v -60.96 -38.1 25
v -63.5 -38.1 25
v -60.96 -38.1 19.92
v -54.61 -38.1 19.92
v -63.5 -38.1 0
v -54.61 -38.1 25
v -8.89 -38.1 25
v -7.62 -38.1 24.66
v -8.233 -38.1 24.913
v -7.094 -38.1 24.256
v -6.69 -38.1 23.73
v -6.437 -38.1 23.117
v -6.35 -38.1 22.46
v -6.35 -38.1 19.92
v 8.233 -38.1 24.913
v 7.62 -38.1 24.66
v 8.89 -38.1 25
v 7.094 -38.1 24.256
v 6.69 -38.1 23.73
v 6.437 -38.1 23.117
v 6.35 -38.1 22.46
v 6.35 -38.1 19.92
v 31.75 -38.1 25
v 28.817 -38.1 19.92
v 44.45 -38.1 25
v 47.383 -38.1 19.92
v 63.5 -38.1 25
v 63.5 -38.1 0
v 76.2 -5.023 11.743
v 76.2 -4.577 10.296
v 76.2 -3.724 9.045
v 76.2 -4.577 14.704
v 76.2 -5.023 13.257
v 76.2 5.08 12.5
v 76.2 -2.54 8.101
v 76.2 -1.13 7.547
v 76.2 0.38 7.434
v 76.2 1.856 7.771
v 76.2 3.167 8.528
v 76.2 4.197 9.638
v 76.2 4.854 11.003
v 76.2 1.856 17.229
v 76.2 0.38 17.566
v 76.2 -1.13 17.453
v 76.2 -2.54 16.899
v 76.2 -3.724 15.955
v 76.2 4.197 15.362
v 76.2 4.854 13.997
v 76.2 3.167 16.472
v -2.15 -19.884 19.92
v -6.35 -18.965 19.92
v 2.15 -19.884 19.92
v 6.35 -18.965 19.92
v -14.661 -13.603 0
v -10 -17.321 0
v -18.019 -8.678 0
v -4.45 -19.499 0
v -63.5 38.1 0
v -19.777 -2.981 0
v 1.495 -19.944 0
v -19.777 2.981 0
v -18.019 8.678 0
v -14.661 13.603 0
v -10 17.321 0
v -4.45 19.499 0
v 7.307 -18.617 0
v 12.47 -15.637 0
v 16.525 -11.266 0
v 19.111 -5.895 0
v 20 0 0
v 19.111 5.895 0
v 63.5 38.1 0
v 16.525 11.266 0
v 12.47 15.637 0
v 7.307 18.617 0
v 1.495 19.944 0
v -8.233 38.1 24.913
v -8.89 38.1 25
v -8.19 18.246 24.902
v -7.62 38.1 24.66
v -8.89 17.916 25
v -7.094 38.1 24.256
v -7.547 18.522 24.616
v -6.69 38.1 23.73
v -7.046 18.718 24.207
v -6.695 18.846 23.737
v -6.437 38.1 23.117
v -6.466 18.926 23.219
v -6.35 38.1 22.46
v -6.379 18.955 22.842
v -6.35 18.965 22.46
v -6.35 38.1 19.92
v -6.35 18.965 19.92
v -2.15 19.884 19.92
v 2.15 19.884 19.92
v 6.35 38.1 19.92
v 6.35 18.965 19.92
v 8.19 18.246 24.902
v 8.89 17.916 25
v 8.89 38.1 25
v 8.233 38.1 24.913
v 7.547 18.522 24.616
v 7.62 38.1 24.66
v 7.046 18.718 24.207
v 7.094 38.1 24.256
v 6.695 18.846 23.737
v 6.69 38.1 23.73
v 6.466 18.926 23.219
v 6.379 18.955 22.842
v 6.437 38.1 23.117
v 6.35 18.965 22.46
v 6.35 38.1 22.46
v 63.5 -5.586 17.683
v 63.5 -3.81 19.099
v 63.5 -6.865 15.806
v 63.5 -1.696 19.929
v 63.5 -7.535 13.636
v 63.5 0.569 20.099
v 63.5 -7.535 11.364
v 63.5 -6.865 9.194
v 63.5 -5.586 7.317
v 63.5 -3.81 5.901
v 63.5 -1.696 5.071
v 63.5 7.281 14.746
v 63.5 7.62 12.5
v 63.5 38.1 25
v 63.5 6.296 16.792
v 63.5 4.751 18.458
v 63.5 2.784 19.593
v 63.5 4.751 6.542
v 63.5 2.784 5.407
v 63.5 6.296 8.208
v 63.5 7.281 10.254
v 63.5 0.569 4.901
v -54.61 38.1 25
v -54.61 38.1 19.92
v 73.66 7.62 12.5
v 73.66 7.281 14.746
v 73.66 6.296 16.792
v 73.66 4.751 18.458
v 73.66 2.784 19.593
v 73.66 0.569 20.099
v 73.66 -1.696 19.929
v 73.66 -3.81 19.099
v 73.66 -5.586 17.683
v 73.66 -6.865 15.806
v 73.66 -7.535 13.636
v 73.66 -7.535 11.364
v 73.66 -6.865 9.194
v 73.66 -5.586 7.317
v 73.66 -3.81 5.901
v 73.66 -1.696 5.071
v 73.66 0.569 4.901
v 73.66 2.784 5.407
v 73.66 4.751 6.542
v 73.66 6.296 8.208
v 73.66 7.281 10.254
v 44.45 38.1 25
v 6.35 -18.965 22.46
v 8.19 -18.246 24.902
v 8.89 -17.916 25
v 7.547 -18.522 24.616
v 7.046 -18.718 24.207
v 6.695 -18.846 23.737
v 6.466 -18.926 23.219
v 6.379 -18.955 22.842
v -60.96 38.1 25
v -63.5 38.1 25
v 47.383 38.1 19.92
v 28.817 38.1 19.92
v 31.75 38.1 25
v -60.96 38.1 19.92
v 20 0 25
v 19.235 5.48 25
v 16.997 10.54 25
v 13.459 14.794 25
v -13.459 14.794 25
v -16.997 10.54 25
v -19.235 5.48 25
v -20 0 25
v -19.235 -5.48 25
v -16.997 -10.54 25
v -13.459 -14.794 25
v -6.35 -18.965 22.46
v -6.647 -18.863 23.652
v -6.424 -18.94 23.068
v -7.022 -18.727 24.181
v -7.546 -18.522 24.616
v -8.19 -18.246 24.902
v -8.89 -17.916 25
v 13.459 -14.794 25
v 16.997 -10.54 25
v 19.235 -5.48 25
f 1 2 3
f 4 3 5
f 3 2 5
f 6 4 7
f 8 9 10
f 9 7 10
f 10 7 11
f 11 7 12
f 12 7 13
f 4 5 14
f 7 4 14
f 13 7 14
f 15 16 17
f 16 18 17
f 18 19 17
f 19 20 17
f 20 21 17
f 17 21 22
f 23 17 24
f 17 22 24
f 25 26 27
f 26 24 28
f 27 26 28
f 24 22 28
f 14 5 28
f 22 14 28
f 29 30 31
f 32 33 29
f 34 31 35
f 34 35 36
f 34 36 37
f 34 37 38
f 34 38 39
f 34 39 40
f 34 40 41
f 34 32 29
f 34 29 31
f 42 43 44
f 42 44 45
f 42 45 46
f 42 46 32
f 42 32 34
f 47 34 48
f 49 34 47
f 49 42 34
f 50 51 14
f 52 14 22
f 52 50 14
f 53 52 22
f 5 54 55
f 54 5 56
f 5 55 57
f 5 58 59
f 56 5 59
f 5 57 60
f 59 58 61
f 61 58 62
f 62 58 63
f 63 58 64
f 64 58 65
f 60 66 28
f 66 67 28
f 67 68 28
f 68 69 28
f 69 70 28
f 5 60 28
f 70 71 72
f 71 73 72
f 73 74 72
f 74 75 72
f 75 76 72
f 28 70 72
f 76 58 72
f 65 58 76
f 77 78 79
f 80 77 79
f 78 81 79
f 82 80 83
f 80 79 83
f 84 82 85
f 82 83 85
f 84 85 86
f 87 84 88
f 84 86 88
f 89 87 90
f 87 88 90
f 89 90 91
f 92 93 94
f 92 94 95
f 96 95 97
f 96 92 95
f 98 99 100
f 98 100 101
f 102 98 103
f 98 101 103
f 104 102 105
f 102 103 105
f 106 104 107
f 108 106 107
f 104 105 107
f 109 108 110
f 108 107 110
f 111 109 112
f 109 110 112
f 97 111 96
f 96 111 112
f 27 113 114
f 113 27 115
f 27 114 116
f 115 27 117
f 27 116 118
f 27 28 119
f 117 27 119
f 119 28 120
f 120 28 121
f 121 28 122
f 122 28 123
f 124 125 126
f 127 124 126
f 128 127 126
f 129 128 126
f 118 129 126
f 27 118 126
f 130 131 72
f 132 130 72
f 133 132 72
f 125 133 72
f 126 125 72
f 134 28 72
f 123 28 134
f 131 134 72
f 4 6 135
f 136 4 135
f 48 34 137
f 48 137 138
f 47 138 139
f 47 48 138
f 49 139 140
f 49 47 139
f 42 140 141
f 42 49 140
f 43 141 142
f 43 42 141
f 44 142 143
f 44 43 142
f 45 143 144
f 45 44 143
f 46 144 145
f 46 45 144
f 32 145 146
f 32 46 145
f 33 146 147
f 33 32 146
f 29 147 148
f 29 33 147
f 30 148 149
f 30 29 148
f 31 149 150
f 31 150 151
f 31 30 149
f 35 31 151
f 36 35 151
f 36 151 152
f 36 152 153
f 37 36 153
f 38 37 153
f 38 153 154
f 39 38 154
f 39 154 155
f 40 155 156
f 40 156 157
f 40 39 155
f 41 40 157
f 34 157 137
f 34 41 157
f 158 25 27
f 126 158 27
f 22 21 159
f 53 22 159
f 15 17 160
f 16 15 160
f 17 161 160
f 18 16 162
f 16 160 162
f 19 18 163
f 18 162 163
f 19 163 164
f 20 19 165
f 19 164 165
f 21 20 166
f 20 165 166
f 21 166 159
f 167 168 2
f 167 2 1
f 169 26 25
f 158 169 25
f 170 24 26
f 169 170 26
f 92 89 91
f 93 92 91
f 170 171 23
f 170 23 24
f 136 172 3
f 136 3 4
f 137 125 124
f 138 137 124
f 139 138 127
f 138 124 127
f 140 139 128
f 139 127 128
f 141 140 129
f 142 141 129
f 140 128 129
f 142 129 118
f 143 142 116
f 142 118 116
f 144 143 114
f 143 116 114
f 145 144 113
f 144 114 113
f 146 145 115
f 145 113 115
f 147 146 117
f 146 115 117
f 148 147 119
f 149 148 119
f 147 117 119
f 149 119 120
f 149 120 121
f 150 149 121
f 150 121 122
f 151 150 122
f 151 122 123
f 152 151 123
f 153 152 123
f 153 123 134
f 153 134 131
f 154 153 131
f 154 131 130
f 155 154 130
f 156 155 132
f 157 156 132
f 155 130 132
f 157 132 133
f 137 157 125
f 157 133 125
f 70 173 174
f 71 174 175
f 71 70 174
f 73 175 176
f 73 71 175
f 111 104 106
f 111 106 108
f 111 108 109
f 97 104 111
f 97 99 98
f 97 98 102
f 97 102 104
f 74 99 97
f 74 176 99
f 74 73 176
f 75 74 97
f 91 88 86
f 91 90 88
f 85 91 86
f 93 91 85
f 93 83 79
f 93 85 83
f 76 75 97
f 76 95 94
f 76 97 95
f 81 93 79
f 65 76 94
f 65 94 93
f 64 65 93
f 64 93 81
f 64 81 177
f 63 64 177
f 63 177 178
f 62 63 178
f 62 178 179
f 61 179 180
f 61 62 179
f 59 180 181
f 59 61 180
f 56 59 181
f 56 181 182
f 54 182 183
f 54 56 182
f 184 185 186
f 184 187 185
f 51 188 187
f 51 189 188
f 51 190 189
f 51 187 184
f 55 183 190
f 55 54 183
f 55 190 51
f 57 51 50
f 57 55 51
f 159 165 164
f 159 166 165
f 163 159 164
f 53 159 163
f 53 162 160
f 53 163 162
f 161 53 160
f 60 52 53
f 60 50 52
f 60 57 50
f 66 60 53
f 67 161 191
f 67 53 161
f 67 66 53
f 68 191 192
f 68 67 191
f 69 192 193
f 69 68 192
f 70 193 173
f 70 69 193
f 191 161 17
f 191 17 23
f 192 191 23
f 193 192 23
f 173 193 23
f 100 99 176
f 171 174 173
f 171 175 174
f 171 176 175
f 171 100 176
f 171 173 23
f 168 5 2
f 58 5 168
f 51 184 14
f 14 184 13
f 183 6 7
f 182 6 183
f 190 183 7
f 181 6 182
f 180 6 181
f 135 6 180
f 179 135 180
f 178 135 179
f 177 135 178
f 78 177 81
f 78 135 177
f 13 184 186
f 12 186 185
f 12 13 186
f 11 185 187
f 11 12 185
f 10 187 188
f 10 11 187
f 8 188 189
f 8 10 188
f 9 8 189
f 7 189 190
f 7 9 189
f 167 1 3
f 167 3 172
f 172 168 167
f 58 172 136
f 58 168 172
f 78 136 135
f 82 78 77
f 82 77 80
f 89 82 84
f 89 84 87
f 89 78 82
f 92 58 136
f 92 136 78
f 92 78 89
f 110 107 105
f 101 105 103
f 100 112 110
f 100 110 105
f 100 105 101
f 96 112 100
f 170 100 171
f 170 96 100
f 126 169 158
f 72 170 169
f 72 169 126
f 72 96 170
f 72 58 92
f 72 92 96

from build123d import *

# Parameters (mm, degrees)
F0_W     = 127
F0_H     = 76.2
F0_R     = 20
F1_DEPTH = 25
F2_W     = 6.35
F2_H     = 76.2
F3_DEPTH = 5.08
F5_DEPTH = 76.201
F6_R     = 7.62
F7_DEPTH = 12.7
F8_R     = 2.54
F9_SIZE  = 2.54


with BuildPart() as f1:
    # F0 (on Top) → F1 (new body)
    with BuildSketch(Plane.XY):
        Rectangle(F0_W, F0_H)
        Circle(F0_R, mode=Mode.SUBTRACT)
    extrude(amount=F1_DEPTH)

    # F2 (on face) → F3 (cut)
    with BuildSketch(Plane.XY.offset(25)):
        with Locations((-57.785, 0)):
            Rectangle(F2_W, F2_H)
        with BuildLine():
            Line((-6.35, -18.9651654356), (-6.35, -38.1))
            Line((-6.35, -38.1), (6.35, -38.1))
            Line((6.35, -38.1), (6.35, -18.9651654356))
            ThreePointArc((6.35, -18.9651654356), (0, -20), (-6.35, -18.9651654356))
        make_face()
        with BuildLine():
            Line((6.35, 38.1), (-6.35, 38.1))
            Line((-6.35, 38.1), (-6.35, 18.9651654356))
            ThreePointArc((-6.35, 18.9651654356), (0, 20), (6.35, 18.9651654356))
            Line((6.35, 18.9651654356), (6.35, 38.1))
        make_face()
    extrude(amount=-F3_DEPTH, mode=Mode.SUBTRACT)

    # F4 (on face) → F5 (cut, through all)
    with BuildSketch(Plane.XZ.offset(38.1)):
        Polygon((44.45, 25), (31.75, 25), (28.8170606325, 19.92), (47.3829393675, 19.92), align=None)
    extrude(amount=-F5_DEPTH, mode=Mode.SUBTRACT)

    # F6 (on face) → F7 (join)
    with BuildSketch(Plane.YZ.offset(63.5)):
        with Locations((0, 12.5)):
            Circle(F6_R)
    extrude(amount=F7_DEPTH)

    # F8
    f8_edges = [f1.edges().sort_by_distance(p)[0] for p in [
        (-6.35, -28.532583, 25),
        (-6.35, 28.532583, 25),
        (6.35, 28.532583, 25),
        (6.35, -28.532583, 25),
    ]]
    fillet(f8_edges, radius=F8_R)

    # F9
    f9_edges = [f1.edges().sort_by_distance(p)[0] for p in [
        (76.2, -7.62, 12.5),
    ]]
    chamfer(f9_edges, length=F9_SIZE)


solid = f1.part
